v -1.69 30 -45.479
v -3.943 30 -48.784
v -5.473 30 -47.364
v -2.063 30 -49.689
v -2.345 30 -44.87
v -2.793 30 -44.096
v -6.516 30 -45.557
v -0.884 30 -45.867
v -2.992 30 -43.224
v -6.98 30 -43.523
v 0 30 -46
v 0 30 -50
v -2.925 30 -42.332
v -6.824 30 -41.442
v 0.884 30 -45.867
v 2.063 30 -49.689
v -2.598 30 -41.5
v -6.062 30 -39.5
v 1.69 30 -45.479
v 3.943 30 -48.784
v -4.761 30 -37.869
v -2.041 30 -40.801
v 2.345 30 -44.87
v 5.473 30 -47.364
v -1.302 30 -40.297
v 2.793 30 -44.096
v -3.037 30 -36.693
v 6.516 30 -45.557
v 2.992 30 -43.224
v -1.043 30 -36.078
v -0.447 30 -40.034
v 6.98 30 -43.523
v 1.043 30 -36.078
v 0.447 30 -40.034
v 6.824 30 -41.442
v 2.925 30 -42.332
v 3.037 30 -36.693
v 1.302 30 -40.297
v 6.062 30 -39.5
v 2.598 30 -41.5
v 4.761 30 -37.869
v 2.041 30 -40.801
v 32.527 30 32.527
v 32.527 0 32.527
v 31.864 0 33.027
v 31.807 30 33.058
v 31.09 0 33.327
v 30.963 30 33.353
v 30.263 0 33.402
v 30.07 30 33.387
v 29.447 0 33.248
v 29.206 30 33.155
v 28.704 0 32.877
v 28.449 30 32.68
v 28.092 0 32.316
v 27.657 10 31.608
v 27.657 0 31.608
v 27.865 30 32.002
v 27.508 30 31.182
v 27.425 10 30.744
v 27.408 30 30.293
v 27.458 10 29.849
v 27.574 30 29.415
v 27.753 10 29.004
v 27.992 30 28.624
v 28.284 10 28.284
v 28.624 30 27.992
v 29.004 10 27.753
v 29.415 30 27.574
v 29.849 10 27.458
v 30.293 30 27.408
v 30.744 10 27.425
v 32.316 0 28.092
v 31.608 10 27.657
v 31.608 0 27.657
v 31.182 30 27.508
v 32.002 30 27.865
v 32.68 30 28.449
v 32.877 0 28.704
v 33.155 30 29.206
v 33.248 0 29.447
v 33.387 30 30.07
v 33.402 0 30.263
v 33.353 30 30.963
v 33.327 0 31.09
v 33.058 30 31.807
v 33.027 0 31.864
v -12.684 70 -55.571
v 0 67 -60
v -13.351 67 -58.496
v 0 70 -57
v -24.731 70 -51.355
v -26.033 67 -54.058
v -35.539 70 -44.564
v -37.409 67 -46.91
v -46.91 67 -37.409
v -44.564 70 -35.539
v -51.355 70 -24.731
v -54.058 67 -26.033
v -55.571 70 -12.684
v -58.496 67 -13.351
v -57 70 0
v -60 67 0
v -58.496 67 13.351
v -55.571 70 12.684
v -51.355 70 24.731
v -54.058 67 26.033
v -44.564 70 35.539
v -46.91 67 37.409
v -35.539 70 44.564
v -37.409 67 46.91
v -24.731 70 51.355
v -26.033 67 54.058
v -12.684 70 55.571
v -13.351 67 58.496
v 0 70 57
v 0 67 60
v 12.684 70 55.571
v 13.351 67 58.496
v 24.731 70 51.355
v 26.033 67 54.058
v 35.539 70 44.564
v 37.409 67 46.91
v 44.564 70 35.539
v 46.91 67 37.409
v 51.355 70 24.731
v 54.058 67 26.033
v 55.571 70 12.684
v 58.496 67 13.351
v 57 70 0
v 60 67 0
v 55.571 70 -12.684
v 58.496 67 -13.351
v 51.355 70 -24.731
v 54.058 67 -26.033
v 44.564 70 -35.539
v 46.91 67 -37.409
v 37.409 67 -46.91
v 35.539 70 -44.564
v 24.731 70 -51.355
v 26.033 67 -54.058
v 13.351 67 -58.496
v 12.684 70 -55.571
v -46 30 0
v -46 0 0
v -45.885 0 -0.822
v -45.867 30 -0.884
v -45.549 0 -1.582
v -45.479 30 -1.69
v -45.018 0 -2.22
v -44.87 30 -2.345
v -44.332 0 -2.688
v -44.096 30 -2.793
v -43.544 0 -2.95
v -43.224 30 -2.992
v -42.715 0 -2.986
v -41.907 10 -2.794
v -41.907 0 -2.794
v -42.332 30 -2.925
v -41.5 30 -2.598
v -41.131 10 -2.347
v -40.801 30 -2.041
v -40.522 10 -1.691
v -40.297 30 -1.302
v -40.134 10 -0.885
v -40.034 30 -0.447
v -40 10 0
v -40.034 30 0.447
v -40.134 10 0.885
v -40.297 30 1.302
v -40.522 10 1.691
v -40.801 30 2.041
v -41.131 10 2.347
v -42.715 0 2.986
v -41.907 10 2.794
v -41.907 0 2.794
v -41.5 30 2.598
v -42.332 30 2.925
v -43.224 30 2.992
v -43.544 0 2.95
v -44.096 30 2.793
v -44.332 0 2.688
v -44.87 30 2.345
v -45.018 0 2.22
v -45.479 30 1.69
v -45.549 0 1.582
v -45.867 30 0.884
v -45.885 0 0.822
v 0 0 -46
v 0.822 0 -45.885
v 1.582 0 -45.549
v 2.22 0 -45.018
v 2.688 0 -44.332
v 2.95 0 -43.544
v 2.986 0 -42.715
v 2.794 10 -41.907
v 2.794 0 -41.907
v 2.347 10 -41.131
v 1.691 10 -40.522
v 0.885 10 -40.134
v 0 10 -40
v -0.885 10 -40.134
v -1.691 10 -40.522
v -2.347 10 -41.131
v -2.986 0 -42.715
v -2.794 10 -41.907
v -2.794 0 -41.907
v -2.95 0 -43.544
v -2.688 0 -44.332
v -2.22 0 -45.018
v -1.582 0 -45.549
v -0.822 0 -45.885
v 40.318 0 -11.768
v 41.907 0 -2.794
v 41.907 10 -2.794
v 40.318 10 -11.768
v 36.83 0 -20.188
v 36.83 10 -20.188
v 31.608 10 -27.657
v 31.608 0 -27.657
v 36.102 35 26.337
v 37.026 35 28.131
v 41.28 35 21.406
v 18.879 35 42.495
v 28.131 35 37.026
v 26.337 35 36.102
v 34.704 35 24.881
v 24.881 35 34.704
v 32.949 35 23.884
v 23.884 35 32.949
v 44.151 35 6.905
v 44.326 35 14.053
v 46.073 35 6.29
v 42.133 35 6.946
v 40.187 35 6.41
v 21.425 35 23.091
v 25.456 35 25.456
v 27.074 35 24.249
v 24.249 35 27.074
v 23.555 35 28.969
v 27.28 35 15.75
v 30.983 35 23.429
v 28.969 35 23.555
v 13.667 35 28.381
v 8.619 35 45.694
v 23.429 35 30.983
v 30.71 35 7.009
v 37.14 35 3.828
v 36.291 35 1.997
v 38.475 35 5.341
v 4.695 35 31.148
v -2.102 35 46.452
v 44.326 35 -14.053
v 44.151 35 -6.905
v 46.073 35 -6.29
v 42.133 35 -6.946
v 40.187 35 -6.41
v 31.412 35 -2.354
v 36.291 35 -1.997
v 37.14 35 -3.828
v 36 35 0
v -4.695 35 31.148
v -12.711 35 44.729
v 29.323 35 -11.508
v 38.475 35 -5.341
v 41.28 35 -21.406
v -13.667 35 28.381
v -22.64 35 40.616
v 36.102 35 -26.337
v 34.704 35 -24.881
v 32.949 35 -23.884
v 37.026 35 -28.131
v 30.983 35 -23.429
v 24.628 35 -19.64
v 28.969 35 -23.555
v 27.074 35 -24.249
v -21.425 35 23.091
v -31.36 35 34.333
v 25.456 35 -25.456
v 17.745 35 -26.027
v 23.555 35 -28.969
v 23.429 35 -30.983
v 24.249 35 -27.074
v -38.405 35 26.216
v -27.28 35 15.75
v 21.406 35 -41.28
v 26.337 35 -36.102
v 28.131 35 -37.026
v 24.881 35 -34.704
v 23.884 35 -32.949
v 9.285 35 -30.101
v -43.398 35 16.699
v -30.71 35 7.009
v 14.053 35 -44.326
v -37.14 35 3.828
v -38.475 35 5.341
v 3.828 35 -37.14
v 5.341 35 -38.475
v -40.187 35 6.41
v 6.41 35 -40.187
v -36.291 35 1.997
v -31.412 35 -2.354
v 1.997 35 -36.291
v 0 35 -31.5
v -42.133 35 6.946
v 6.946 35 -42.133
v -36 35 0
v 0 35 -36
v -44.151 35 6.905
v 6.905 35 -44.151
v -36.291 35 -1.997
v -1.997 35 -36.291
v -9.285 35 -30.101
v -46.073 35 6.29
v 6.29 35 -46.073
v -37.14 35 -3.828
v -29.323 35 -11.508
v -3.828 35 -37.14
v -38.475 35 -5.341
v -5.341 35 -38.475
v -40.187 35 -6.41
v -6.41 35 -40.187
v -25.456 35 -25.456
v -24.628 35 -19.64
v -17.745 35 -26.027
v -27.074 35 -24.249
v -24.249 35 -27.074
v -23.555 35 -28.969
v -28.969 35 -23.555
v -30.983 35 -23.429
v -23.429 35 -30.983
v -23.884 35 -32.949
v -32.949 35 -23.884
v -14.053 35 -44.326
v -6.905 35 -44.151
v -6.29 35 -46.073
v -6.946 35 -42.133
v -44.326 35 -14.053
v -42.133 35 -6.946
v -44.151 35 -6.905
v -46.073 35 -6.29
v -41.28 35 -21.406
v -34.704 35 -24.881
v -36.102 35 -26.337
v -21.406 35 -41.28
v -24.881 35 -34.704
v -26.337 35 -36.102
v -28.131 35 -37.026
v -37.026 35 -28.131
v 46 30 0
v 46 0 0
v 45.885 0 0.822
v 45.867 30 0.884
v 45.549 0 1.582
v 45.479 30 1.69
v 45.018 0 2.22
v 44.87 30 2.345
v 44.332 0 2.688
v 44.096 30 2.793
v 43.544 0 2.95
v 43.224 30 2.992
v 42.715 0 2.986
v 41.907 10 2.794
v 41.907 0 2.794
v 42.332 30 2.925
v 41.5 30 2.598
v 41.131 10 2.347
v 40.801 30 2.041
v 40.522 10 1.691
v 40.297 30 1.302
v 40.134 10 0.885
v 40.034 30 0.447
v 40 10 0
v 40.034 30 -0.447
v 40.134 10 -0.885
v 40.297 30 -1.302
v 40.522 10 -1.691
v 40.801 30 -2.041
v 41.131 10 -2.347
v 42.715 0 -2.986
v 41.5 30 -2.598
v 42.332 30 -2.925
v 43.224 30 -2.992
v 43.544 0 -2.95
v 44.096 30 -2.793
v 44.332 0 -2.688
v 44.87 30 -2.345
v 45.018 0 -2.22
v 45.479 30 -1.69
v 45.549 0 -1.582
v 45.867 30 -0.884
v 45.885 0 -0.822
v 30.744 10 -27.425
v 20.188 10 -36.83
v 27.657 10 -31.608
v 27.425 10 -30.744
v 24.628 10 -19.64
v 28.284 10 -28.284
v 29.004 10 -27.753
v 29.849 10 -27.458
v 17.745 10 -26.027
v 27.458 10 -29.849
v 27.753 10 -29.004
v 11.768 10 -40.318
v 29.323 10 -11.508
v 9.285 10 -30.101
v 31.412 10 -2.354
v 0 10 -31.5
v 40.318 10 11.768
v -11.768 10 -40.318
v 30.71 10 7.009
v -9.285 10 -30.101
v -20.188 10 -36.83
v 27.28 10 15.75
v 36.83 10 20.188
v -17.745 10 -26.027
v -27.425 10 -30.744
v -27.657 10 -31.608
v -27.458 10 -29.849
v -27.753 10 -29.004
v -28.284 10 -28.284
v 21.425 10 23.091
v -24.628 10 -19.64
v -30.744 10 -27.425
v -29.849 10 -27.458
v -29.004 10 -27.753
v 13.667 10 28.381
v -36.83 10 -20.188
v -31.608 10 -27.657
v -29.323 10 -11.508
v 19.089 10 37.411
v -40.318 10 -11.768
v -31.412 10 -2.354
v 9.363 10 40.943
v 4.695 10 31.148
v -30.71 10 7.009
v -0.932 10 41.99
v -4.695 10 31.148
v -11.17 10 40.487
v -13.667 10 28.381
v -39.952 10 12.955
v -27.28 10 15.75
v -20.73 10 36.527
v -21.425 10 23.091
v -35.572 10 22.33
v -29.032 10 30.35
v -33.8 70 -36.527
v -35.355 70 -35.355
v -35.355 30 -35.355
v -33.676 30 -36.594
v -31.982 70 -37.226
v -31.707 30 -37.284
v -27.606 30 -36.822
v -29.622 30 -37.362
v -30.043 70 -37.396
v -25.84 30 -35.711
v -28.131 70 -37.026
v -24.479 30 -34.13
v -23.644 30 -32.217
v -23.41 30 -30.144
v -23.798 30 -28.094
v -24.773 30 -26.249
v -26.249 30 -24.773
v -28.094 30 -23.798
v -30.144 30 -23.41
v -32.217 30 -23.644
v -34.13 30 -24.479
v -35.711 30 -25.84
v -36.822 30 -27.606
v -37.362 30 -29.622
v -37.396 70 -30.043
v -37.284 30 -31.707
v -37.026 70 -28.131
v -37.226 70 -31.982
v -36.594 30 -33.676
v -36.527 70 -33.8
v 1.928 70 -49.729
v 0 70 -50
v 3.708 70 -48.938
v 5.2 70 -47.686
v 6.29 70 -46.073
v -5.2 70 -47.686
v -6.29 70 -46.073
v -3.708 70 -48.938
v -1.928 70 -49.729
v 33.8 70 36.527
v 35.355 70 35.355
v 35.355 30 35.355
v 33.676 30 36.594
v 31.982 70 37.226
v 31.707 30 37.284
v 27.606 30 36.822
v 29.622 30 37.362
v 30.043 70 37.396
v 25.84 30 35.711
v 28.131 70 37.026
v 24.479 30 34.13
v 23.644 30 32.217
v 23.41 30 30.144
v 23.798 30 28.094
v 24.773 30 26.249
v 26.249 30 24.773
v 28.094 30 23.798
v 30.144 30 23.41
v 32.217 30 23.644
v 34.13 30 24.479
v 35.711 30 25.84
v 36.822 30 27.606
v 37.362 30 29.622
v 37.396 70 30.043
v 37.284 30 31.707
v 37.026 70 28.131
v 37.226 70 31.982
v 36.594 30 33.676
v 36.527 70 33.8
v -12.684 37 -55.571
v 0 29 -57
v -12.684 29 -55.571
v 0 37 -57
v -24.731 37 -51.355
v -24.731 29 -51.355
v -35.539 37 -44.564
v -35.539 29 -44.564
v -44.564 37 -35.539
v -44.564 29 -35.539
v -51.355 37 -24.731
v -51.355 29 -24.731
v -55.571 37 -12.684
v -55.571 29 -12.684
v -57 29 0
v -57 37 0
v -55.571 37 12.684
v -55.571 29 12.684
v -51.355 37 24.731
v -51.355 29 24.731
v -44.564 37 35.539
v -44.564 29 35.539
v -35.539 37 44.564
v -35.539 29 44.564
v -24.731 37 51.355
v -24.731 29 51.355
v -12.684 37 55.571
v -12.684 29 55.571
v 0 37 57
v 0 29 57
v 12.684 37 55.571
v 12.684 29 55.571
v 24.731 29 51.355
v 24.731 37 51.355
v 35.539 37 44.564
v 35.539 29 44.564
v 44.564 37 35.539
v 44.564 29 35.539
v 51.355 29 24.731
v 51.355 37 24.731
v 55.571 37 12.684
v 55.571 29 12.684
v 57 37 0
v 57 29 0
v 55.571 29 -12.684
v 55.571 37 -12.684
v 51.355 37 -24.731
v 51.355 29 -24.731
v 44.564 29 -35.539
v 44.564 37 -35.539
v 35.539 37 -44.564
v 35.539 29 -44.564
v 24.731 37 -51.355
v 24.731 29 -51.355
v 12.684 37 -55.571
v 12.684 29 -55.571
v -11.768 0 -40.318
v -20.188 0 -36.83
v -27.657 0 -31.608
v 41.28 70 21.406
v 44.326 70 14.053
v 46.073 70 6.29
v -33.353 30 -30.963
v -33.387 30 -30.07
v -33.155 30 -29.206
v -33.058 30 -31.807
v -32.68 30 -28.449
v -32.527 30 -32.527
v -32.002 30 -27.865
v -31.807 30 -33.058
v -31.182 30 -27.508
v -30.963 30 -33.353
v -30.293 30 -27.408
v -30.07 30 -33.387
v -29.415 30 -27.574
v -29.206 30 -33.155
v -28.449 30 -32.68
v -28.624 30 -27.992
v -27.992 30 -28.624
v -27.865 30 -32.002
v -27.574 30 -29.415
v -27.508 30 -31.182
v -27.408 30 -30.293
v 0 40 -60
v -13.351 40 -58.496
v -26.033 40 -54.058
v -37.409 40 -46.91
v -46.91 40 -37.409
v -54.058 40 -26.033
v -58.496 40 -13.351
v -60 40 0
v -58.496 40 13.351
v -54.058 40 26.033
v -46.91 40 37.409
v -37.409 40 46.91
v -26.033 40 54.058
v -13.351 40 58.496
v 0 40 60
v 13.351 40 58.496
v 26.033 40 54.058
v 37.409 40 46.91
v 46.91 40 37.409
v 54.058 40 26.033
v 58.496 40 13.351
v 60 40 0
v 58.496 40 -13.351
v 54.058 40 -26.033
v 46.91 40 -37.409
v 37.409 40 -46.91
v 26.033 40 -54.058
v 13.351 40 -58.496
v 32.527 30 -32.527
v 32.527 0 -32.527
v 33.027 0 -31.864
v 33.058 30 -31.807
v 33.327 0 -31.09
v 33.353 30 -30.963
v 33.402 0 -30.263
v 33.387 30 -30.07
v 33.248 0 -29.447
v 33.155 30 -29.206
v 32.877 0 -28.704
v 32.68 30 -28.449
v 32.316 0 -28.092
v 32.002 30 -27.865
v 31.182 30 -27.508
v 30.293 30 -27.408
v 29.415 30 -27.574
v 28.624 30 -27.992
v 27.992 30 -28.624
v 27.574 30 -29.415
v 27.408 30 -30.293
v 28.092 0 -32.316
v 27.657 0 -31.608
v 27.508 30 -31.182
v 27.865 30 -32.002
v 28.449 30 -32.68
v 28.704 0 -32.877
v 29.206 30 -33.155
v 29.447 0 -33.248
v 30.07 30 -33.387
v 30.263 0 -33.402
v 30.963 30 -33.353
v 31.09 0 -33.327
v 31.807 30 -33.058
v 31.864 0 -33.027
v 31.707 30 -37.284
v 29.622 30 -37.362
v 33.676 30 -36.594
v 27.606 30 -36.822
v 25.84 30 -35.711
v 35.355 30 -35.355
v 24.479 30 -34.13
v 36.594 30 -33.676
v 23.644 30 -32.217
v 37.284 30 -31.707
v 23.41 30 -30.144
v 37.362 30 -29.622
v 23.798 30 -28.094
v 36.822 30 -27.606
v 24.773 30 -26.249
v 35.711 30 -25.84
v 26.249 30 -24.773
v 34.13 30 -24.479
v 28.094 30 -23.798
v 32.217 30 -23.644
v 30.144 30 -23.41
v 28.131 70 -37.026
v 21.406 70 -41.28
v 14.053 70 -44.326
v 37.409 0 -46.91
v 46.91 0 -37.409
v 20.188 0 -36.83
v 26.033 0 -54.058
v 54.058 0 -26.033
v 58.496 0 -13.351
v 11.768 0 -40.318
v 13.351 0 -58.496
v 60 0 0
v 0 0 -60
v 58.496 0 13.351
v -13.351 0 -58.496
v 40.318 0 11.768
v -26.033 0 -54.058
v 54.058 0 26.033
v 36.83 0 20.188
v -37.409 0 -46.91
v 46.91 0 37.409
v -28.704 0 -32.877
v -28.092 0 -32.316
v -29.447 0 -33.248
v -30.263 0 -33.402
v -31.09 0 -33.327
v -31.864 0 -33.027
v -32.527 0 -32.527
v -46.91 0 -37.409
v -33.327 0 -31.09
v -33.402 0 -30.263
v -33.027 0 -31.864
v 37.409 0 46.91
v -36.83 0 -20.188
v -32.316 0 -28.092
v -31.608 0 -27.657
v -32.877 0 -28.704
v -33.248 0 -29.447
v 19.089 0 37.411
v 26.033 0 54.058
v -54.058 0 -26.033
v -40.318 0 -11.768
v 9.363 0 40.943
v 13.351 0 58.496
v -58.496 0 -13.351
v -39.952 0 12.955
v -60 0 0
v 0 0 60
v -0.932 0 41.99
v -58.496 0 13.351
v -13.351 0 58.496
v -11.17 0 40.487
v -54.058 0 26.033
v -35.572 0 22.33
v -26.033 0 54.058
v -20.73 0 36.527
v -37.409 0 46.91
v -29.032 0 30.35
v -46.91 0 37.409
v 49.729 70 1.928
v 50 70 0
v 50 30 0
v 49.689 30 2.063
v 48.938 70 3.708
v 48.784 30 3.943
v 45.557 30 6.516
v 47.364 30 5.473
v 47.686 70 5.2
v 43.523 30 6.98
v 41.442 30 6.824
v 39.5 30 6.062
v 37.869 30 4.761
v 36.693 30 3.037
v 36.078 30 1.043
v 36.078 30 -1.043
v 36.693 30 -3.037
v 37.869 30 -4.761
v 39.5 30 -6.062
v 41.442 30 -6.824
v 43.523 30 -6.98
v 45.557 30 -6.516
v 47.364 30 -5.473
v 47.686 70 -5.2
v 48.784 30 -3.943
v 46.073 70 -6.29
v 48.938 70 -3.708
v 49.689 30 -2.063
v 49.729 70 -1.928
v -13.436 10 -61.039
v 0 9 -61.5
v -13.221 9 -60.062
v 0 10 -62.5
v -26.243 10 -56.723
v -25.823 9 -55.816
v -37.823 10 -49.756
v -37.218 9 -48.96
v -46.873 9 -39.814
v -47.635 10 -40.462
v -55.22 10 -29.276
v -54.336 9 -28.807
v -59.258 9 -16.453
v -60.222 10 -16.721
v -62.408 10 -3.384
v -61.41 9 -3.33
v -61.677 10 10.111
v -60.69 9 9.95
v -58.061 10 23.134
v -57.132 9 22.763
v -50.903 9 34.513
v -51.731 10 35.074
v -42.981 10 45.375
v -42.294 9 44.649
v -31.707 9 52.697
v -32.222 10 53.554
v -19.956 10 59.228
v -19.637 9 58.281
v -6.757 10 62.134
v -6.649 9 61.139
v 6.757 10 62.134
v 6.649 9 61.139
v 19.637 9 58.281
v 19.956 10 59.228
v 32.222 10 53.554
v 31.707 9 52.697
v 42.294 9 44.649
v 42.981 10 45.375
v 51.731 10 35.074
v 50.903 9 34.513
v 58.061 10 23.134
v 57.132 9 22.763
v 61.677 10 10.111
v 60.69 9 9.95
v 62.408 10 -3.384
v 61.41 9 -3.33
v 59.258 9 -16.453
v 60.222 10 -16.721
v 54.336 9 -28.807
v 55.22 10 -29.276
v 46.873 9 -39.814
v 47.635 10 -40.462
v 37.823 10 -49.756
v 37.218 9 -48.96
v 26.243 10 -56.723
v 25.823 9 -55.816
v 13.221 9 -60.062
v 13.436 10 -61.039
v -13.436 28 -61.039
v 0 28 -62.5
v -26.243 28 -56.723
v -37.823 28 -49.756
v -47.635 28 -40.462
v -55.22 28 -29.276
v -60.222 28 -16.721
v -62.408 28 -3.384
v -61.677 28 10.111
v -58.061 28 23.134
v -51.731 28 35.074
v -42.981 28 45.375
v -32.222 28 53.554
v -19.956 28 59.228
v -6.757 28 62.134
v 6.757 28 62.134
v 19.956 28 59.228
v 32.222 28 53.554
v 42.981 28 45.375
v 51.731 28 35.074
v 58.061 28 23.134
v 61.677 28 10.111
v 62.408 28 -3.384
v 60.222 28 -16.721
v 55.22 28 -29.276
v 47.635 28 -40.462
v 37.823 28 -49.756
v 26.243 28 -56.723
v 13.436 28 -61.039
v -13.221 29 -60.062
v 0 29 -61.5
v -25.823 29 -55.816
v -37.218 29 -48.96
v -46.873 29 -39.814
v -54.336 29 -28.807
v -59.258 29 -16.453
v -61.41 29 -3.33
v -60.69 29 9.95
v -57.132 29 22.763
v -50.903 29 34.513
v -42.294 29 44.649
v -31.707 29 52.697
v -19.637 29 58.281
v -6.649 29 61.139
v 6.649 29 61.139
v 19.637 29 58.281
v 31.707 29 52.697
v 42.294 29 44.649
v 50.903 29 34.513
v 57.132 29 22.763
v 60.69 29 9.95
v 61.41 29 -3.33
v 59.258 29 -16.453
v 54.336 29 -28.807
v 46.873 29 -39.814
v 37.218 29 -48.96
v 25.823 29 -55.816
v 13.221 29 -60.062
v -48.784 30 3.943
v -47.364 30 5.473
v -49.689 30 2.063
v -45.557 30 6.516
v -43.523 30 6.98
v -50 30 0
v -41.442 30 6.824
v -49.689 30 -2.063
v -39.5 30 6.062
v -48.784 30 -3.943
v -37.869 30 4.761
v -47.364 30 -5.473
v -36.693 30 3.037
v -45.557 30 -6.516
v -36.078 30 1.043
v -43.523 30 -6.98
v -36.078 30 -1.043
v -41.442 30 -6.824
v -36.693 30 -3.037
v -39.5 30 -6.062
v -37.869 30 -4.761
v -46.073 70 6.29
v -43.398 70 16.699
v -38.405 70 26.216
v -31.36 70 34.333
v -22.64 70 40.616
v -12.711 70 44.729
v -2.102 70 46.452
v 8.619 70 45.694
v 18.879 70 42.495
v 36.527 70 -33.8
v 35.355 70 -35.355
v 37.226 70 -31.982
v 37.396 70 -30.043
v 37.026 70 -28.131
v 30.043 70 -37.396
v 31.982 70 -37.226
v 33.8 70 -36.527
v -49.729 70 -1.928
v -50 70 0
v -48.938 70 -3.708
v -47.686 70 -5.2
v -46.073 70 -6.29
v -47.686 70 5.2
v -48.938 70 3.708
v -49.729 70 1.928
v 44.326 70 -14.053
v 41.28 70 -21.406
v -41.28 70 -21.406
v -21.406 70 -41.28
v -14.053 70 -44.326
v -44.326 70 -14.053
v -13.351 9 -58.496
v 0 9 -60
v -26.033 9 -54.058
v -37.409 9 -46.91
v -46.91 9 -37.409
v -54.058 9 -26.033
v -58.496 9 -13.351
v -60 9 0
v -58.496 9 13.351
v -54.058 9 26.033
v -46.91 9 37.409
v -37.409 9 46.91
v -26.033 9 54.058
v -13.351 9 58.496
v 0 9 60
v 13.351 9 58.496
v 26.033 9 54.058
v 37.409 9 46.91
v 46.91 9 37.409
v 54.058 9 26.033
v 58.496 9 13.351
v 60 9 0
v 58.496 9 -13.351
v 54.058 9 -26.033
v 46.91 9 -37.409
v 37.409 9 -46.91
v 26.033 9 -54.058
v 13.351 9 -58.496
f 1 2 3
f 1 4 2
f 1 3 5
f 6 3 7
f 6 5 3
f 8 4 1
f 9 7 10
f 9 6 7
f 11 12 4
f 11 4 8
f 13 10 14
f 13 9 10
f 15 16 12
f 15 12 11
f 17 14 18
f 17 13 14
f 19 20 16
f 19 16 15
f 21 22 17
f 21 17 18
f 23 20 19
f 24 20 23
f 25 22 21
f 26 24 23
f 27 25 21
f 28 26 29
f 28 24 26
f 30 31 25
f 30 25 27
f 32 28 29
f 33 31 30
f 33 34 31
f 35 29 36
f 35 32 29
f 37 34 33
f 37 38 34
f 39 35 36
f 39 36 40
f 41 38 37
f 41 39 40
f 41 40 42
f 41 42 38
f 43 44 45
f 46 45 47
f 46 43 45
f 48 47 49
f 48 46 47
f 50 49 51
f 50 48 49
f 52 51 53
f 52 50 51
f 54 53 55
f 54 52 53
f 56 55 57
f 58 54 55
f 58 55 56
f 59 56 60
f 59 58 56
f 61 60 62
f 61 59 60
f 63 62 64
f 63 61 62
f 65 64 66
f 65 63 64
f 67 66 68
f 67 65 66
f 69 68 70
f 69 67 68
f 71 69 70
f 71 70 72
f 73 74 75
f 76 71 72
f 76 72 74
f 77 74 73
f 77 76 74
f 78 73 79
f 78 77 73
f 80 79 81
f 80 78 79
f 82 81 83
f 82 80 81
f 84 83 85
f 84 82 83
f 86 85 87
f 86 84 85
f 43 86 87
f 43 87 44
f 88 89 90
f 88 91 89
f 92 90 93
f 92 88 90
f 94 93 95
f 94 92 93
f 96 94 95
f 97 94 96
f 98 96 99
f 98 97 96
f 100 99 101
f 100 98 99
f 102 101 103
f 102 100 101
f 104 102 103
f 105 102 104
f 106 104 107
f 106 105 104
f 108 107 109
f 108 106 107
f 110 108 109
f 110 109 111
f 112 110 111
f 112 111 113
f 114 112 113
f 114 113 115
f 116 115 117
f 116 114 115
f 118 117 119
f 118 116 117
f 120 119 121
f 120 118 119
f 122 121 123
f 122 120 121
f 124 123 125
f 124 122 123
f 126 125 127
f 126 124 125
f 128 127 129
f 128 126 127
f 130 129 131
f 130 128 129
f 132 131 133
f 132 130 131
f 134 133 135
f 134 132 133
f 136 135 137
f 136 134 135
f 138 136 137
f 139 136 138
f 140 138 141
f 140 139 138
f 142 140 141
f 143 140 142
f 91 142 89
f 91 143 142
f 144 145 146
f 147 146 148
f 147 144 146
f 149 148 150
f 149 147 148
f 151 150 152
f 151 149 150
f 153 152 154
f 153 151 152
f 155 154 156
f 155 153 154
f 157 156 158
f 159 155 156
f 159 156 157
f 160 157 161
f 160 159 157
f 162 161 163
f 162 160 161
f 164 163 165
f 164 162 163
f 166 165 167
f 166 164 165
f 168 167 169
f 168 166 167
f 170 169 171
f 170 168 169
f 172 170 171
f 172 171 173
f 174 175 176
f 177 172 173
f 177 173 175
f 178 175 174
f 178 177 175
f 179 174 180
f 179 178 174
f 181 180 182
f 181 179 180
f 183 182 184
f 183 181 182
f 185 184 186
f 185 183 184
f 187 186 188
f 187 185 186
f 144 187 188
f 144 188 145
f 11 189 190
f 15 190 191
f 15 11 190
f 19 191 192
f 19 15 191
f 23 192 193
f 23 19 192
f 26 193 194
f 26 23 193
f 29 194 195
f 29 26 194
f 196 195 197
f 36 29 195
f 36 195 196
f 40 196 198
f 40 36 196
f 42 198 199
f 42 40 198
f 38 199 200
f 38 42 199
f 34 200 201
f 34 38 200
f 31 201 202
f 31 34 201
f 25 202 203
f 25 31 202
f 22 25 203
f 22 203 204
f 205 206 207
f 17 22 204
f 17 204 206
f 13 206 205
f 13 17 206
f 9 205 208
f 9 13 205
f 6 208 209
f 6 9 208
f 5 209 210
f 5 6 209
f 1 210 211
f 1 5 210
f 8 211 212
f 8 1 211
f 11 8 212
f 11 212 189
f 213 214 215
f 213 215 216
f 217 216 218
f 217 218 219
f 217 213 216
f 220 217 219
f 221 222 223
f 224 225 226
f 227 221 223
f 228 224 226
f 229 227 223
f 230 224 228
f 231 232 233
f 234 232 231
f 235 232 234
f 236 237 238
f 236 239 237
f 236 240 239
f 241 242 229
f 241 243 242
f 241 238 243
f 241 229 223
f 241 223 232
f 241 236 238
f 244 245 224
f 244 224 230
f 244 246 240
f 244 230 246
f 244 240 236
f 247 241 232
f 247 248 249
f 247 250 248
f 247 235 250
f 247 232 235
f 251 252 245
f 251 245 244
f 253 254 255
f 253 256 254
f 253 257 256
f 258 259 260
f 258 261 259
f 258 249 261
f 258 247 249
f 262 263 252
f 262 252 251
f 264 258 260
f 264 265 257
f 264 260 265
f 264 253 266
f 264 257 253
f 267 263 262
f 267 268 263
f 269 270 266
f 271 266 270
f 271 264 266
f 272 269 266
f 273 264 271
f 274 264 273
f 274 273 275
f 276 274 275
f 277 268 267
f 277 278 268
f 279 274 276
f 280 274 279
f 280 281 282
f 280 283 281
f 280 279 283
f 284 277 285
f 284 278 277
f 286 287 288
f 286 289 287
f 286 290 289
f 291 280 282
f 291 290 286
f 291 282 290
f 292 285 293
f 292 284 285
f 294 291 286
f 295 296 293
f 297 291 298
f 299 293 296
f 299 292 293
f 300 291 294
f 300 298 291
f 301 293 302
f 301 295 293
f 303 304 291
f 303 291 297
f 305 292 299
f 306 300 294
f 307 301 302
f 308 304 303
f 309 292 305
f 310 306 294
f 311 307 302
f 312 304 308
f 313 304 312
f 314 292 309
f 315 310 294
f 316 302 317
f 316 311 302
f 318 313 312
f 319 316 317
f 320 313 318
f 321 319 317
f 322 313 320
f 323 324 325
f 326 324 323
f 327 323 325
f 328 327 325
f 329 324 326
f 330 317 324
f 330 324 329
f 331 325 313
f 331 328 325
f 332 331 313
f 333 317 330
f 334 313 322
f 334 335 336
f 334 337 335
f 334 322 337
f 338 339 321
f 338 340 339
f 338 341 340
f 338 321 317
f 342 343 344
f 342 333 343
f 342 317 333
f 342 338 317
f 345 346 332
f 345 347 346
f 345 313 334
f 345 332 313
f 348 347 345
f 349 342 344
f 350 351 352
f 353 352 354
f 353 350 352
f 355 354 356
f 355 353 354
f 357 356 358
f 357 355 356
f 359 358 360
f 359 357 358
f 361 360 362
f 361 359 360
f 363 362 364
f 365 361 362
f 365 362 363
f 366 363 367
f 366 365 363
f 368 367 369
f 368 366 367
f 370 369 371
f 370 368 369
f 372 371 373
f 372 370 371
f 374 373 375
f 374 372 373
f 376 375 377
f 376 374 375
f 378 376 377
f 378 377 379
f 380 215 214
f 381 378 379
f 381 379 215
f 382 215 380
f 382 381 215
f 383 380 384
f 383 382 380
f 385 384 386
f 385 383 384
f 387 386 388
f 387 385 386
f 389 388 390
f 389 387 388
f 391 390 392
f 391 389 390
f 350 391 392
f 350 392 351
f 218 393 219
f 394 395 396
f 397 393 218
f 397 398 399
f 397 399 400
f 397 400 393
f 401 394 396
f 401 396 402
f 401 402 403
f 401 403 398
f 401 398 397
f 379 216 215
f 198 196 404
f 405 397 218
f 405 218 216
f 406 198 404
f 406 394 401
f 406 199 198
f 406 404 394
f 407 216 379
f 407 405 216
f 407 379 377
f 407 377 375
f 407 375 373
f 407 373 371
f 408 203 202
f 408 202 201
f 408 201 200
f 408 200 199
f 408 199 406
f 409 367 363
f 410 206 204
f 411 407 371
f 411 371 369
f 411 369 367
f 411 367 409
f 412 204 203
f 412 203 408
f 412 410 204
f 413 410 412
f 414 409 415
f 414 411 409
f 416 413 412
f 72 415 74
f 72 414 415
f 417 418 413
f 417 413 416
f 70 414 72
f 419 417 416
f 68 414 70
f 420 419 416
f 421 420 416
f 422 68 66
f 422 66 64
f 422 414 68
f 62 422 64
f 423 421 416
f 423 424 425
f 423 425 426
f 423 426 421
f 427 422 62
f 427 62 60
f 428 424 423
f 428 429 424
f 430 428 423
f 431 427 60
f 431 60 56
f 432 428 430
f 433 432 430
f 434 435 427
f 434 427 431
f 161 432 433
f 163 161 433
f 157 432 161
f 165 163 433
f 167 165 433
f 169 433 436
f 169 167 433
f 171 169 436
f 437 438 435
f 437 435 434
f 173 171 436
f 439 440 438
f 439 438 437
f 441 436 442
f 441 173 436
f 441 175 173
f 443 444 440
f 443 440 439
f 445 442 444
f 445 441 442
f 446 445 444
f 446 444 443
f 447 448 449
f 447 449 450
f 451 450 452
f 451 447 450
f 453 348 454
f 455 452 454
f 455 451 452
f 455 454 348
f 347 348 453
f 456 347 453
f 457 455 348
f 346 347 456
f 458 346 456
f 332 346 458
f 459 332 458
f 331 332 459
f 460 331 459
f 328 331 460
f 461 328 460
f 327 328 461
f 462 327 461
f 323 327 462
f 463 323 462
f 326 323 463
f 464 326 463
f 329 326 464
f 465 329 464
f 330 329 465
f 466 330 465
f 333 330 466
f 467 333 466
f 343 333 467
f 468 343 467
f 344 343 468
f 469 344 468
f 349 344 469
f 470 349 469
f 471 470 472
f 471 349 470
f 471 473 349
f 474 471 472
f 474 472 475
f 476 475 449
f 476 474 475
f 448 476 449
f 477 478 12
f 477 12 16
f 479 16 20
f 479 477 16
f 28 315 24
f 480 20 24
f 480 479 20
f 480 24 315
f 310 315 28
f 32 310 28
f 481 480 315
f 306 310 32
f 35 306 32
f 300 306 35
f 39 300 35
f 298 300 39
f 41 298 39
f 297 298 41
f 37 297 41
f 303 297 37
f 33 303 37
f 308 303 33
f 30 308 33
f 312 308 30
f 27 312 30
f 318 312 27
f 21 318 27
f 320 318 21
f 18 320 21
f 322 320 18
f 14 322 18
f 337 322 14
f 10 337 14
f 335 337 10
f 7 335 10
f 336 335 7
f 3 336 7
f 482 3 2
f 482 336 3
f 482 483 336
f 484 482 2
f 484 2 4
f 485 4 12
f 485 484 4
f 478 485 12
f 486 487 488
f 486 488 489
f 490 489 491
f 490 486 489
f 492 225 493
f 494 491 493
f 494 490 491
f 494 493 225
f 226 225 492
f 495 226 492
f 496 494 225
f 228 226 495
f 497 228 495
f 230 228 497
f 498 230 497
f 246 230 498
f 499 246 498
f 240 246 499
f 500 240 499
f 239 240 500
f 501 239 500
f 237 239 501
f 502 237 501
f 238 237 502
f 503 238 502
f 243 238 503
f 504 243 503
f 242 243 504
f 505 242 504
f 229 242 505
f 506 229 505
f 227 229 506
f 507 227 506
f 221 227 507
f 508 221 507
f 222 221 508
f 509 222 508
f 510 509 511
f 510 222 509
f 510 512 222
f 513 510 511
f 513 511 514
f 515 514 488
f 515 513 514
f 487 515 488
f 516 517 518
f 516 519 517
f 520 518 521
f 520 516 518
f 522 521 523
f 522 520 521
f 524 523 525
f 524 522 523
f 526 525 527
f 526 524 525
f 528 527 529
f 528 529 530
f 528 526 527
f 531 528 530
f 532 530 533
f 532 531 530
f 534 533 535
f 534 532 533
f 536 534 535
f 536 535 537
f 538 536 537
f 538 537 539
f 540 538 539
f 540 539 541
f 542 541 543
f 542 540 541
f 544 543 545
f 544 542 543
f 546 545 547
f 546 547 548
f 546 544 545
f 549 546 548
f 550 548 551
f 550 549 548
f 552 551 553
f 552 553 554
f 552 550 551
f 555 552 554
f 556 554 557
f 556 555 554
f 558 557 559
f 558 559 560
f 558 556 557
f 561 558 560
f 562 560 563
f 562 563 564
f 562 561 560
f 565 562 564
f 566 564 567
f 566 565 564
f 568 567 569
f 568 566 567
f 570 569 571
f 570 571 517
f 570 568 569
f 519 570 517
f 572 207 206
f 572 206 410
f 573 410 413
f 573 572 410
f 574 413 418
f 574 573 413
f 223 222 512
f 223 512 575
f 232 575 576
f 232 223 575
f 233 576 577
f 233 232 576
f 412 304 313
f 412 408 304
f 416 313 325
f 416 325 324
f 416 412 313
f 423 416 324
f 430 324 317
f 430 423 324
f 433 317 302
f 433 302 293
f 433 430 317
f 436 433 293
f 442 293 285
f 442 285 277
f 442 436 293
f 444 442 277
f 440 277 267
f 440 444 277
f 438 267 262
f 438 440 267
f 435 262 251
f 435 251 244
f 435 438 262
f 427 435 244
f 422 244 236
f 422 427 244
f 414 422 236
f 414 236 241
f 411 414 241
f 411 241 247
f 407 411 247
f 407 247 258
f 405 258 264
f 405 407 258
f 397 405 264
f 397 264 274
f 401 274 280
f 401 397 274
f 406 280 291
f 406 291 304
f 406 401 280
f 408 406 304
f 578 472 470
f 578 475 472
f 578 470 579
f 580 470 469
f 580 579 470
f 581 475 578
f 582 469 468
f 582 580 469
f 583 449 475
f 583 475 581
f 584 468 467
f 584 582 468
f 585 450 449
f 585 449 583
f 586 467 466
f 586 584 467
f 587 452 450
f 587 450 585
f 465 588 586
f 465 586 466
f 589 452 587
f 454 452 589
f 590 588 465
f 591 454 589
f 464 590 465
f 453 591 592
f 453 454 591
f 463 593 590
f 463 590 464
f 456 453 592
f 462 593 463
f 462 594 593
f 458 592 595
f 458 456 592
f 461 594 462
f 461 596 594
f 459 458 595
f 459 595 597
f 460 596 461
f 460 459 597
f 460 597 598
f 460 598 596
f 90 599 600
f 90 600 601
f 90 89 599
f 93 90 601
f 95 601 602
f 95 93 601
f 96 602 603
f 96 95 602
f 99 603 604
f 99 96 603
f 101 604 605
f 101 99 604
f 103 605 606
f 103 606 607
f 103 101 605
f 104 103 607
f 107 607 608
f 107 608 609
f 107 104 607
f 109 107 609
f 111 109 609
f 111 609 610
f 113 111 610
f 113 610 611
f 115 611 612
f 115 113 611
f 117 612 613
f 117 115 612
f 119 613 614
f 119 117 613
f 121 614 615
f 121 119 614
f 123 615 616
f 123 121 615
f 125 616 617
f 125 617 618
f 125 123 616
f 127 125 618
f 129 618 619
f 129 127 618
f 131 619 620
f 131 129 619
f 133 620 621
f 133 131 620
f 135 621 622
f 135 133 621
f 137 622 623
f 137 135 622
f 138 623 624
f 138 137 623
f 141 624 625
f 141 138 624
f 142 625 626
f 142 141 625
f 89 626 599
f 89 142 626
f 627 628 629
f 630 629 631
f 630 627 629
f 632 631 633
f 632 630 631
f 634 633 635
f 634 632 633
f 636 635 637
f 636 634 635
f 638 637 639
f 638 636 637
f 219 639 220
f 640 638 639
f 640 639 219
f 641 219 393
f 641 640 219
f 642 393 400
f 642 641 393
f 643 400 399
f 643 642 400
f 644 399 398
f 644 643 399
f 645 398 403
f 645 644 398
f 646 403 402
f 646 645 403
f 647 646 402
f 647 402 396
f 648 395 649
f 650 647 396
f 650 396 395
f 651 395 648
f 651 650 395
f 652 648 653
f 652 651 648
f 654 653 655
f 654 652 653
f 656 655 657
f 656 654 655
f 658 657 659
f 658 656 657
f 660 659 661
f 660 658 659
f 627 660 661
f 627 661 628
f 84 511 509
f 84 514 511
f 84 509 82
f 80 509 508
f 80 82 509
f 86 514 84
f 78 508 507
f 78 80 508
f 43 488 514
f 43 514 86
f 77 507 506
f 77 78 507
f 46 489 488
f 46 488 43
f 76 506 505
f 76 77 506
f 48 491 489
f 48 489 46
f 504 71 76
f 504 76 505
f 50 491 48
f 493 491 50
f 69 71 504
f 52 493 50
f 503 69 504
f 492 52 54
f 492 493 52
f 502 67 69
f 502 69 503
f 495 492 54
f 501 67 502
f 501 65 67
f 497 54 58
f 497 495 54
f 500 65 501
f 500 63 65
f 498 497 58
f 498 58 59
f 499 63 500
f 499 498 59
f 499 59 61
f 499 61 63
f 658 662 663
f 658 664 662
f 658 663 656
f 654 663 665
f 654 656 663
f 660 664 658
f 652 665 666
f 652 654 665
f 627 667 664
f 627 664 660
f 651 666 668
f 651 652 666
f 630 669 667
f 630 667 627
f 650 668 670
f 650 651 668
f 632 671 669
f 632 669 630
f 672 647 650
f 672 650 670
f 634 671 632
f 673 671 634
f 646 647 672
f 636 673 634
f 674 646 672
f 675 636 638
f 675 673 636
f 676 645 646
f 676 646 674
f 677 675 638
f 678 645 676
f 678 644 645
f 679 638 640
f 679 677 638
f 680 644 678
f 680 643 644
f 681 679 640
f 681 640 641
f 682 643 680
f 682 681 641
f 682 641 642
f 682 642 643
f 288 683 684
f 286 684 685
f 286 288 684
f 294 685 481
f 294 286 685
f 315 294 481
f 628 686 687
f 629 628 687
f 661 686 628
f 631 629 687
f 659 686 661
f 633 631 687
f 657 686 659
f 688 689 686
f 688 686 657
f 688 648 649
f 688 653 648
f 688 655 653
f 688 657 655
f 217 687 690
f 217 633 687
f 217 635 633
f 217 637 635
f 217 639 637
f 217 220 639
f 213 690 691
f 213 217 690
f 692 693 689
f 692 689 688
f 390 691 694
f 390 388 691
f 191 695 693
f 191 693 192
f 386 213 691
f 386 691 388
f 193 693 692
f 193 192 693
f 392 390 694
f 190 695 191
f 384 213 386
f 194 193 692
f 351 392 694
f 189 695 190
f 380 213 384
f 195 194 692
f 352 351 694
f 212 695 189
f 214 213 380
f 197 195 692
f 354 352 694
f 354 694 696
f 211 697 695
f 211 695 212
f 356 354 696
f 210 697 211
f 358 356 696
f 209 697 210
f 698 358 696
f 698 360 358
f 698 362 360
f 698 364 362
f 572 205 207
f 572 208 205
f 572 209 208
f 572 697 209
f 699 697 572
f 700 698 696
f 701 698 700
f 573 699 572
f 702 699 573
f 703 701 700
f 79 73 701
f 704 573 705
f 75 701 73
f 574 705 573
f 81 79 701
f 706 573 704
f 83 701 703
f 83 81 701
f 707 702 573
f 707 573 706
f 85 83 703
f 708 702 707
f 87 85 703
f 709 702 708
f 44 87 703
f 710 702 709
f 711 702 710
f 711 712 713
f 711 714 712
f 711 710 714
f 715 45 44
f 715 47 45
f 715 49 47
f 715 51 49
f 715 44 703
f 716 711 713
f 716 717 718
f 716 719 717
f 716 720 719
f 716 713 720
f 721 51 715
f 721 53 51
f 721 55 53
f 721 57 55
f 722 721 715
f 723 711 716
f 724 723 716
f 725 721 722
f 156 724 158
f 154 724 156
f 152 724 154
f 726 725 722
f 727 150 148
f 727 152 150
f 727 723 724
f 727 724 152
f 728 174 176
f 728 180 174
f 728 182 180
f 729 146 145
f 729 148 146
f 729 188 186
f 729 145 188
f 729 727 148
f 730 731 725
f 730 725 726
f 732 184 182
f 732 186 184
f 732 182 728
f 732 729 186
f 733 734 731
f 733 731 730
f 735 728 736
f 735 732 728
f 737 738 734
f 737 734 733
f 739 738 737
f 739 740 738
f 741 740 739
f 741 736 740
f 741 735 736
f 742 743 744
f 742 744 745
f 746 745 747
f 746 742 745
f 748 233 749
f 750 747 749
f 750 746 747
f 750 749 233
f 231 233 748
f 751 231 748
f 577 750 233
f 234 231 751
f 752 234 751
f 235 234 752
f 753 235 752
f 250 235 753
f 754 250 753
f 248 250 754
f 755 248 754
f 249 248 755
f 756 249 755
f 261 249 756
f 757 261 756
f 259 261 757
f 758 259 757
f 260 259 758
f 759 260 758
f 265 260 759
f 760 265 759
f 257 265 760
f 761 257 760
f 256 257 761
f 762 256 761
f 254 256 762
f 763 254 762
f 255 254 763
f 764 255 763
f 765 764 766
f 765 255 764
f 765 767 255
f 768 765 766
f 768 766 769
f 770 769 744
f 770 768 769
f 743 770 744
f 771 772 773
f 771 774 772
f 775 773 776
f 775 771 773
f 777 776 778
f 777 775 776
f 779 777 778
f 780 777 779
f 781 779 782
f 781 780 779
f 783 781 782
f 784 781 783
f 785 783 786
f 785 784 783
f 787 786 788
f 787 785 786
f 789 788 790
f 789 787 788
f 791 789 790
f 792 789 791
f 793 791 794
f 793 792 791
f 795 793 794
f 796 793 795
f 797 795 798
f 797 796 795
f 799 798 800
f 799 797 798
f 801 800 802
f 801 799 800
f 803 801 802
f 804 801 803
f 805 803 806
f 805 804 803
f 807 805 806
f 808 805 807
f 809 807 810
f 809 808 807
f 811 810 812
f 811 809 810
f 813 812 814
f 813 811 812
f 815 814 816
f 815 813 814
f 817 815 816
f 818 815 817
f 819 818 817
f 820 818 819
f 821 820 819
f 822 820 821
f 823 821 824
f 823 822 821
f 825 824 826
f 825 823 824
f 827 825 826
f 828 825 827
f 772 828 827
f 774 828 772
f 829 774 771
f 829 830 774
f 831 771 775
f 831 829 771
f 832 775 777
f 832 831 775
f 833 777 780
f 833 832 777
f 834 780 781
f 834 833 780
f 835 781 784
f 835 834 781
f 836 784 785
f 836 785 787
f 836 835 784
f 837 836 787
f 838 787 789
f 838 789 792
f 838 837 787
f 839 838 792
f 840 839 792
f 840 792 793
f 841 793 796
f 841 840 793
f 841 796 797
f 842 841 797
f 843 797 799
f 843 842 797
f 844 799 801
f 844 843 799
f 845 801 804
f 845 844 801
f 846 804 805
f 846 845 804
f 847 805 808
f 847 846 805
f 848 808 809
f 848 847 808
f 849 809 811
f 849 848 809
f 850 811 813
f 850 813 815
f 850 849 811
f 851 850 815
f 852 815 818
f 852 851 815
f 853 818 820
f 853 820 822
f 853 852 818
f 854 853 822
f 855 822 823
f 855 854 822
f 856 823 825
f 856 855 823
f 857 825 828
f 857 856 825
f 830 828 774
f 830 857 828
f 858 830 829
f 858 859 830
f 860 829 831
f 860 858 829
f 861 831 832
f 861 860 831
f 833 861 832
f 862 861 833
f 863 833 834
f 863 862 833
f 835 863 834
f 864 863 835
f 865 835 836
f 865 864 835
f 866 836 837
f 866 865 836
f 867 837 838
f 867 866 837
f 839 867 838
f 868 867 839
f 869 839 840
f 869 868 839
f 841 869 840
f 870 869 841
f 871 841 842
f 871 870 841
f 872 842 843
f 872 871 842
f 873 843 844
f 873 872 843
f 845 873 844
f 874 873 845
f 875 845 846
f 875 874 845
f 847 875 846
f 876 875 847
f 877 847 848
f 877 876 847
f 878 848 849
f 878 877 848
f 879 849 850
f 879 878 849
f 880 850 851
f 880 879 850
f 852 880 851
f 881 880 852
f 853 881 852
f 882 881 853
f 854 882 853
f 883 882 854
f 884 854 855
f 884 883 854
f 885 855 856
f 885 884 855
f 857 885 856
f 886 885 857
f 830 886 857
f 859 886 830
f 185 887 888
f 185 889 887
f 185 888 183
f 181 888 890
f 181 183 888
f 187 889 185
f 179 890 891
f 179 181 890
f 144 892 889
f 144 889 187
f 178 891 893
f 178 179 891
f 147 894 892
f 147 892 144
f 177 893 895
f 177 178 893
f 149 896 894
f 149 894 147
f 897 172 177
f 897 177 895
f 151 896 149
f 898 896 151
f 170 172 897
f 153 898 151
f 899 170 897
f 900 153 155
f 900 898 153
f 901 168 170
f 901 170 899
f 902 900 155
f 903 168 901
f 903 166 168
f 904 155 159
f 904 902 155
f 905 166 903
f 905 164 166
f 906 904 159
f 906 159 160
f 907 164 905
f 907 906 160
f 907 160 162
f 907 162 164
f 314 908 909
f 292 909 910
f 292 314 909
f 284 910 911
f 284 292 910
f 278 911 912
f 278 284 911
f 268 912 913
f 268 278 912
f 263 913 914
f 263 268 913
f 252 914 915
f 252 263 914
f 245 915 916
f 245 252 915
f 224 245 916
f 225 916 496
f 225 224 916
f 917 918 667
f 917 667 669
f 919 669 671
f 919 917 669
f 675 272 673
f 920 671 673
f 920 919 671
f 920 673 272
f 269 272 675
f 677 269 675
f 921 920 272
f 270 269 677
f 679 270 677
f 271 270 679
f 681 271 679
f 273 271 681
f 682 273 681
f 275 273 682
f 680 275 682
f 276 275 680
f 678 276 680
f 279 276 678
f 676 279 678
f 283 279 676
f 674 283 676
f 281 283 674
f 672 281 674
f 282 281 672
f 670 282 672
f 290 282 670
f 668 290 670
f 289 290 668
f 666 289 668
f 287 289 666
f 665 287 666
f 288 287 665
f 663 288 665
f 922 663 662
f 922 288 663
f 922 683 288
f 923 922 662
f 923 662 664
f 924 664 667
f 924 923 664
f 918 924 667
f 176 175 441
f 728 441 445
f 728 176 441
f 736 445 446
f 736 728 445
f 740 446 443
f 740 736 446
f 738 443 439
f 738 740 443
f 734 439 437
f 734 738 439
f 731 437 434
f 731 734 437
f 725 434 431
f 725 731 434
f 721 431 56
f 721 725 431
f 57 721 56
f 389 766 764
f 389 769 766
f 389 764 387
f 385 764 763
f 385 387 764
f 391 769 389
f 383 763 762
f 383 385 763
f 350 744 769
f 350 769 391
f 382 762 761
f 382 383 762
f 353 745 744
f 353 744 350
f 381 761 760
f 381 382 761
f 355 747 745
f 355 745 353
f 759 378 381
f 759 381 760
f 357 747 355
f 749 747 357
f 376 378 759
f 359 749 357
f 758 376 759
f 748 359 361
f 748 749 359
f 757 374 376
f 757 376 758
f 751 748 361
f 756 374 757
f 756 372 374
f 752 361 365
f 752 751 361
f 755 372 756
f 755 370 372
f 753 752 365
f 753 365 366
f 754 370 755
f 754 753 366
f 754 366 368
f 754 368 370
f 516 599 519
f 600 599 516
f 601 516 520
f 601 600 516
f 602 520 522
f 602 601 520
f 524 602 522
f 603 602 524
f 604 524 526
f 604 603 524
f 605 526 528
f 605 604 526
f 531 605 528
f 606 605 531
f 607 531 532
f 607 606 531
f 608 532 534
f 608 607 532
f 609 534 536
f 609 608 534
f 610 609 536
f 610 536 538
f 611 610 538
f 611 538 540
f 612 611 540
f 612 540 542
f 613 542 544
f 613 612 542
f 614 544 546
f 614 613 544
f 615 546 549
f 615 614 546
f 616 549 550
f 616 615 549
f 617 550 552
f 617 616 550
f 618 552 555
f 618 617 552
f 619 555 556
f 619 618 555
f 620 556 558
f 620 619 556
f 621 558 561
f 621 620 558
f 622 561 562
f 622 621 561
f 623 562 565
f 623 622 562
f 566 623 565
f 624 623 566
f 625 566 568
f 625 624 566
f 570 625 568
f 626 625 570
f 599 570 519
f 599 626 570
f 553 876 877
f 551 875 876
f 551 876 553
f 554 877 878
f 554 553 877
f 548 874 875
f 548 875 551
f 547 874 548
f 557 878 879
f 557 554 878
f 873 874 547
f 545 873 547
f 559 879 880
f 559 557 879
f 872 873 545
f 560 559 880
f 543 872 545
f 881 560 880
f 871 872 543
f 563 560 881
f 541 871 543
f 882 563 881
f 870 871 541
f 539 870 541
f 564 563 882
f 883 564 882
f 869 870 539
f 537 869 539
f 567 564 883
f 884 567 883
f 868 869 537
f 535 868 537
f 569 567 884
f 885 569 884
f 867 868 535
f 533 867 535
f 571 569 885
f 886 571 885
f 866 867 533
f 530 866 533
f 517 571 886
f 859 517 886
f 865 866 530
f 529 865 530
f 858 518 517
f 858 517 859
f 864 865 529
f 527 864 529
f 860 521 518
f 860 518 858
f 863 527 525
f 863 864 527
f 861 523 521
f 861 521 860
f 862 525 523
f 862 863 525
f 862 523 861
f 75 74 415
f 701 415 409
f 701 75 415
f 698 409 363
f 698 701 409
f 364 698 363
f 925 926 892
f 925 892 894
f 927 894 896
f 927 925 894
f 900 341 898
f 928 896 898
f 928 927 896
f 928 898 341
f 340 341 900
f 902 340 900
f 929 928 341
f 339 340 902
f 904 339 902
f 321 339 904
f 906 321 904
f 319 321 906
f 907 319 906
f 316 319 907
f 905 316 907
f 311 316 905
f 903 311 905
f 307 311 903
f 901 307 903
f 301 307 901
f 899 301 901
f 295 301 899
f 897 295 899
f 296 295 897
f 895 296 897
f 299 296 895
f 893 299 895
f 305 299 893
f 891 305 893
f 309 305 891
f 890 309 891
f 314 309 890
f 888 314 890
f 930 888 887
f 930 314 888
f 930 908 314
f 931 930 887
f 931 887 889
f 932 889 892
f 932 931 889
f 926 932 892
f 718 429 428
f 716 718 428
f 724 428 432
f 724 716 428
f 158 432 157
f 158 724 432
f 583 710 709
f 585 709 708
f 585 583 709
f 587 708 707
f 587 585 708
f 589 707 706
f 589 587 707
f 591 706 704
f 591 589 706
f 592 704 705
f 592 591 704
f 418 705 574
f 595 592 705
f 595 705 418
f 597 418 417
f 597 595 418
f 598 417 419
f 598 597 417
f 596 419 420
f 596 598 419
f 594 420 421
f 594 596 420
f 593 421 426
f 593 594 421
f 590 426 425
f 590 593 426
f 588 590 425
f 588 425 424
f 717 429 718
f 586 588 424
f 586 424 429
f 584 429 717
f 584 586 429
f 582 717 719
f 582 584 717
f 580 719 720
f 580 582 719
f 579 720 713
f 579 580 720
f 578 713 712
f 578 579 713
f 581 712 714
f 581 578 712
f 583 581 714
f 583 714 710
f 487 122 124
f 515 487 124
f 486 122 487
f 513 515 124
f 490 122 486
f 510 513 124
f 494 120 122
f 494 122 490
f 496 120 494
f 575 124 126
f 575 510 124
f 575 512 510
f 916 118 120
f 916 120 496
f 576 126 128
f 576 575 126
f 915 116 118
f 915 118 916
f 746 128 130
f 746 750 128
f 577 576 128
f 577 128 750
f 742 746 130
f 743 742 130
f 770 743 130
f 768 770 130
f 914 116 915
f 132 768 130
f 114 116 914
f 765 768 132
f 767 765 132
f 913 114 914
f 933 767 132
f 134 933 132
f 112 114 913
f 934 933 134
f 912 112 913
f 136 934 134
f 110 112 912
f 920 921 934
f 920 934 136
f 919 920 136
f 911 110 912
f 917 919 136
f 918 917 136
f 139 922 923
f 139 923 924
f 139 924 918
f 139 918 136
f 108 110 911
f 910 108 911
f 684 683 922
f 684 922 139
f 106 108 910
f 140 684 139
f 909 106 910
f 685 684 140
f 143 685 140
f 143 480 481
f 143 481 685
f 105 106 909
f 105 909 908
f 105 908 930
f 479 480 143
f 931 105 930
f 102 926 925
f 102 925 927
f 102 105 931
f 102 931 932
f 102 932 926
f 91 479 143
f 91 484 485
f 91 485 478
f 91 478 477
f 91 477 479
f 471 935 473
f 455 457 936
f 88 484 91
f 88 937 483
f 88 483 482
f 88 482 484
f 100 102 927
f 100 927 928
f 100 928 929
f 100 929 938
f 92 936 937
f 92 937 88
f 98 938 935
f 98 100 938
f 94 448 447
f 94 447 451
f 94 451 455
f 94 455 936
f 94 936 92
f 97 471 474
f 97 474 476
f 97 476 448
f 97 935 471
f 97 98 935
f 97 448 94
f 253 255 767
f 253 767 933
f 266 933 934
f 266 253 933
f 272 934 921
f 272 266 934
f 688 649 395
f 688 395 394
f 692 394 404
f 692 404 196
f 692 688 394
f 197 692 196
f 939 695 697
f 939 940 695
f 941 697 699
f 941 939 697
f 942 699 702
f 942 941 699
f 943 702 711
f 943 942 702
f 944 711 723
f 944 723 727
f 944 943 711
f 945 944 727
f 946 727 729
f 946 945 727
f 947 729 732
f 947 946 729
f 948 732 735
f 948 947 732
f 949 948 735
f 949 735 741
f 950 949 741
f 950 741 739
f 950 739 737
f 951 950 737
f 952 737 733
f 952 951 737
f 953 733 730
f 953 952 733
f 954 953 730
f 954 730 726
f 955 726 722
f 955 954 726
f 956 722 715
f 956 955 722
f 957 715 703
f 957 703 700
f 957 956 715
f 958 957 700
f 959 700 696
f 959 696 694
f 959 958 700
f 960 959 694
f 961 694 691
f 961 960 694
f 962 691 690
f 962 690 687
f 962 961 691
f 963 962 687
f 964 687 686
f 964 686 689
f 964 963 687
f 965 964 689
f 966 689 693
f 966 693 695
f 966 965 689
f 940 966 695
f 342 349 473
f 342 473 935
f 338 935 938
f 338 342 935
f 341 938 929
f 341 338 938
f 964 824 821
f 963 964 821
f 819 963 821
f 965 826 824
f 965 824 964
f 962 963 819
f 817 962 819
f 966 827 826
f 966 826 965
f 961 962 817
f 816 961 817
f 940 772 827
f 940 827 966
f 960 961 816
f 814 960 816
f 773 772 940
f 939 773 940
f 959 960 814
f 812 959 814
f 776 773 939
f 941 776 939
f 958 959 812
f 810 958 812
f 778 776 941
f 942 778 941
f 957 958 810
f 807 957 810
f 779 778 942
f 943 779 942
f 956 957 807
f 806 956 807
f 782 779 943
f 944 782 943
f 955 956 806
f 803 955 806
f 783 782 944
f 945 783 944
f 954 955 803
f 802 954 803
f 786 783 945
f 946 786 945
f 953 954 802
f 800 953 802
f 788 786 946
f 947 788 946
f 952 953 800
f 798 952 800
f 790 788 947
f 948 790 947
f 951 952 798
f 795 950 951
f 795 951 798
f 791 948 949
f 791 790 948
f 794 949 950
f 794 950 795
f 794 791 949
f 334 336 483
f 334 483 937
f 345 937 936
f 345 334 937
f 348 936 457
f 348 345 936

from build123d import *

# Parameters (mm, degrees)
PATTERN_CIRCULAR_1_COUNT = 8


with BuildPart() as part:
    # Эскиз1 → Повернуть1 (revolve)
    with BuildSketch(Plane.XY, mode=Mode.PRIVATE) as revolve_1_sk:
        Polygon((-42, 0), (-60, 0), (-60, 9), (-61.5, 9), (-62.5, 10), (-62.5, 28), (-61.5, 29), (-57, 29), (-57, 37), (-60, 40), (-60, 67), (-57, 70), (-46.5, 70), (-46.5, 35), (-31.5, 35), (-31.5, 10), (-42, 10), align=None)
    revolve(revolve_1_sk.sketch.rotate(Axis((0, 0, 0), (0, 1, 0)), 270), axis=Axis((0, 0, 0), (0, 1, 0)))

    # Эскиз5 → Вырез-Повернуть1 (revolve, cut)
    with BuildSketch(Plane.XY):
        Polygon((-43, 0), (-46, 0), (-46, 30), (-50, 30), (-50, 70), (-43, 70), align=None)
    cut_revolve_1 = revolve(axis=Axis((-43, 84.512066433, 0), (0, -1, 0)), mode=Mode.SUBTRACT)

    # Круговой массив1: Вырез-Повернуть1 ×8 about axis, 2 skipped
    pattern_circular_1_axis = Axis((0, 0, 0), (0, -1, 0))
    add([cut_revolve_1.rotate(pattern_circular_1_axis, i * 360 / PATTERN_CIRCULAR_1_COUNT) for i in range(1, PATTERN_CIRCULAR_1_COUNT) if i not in (6, 7)], mode=Mode.SUBTRACT)


solid = part.part
